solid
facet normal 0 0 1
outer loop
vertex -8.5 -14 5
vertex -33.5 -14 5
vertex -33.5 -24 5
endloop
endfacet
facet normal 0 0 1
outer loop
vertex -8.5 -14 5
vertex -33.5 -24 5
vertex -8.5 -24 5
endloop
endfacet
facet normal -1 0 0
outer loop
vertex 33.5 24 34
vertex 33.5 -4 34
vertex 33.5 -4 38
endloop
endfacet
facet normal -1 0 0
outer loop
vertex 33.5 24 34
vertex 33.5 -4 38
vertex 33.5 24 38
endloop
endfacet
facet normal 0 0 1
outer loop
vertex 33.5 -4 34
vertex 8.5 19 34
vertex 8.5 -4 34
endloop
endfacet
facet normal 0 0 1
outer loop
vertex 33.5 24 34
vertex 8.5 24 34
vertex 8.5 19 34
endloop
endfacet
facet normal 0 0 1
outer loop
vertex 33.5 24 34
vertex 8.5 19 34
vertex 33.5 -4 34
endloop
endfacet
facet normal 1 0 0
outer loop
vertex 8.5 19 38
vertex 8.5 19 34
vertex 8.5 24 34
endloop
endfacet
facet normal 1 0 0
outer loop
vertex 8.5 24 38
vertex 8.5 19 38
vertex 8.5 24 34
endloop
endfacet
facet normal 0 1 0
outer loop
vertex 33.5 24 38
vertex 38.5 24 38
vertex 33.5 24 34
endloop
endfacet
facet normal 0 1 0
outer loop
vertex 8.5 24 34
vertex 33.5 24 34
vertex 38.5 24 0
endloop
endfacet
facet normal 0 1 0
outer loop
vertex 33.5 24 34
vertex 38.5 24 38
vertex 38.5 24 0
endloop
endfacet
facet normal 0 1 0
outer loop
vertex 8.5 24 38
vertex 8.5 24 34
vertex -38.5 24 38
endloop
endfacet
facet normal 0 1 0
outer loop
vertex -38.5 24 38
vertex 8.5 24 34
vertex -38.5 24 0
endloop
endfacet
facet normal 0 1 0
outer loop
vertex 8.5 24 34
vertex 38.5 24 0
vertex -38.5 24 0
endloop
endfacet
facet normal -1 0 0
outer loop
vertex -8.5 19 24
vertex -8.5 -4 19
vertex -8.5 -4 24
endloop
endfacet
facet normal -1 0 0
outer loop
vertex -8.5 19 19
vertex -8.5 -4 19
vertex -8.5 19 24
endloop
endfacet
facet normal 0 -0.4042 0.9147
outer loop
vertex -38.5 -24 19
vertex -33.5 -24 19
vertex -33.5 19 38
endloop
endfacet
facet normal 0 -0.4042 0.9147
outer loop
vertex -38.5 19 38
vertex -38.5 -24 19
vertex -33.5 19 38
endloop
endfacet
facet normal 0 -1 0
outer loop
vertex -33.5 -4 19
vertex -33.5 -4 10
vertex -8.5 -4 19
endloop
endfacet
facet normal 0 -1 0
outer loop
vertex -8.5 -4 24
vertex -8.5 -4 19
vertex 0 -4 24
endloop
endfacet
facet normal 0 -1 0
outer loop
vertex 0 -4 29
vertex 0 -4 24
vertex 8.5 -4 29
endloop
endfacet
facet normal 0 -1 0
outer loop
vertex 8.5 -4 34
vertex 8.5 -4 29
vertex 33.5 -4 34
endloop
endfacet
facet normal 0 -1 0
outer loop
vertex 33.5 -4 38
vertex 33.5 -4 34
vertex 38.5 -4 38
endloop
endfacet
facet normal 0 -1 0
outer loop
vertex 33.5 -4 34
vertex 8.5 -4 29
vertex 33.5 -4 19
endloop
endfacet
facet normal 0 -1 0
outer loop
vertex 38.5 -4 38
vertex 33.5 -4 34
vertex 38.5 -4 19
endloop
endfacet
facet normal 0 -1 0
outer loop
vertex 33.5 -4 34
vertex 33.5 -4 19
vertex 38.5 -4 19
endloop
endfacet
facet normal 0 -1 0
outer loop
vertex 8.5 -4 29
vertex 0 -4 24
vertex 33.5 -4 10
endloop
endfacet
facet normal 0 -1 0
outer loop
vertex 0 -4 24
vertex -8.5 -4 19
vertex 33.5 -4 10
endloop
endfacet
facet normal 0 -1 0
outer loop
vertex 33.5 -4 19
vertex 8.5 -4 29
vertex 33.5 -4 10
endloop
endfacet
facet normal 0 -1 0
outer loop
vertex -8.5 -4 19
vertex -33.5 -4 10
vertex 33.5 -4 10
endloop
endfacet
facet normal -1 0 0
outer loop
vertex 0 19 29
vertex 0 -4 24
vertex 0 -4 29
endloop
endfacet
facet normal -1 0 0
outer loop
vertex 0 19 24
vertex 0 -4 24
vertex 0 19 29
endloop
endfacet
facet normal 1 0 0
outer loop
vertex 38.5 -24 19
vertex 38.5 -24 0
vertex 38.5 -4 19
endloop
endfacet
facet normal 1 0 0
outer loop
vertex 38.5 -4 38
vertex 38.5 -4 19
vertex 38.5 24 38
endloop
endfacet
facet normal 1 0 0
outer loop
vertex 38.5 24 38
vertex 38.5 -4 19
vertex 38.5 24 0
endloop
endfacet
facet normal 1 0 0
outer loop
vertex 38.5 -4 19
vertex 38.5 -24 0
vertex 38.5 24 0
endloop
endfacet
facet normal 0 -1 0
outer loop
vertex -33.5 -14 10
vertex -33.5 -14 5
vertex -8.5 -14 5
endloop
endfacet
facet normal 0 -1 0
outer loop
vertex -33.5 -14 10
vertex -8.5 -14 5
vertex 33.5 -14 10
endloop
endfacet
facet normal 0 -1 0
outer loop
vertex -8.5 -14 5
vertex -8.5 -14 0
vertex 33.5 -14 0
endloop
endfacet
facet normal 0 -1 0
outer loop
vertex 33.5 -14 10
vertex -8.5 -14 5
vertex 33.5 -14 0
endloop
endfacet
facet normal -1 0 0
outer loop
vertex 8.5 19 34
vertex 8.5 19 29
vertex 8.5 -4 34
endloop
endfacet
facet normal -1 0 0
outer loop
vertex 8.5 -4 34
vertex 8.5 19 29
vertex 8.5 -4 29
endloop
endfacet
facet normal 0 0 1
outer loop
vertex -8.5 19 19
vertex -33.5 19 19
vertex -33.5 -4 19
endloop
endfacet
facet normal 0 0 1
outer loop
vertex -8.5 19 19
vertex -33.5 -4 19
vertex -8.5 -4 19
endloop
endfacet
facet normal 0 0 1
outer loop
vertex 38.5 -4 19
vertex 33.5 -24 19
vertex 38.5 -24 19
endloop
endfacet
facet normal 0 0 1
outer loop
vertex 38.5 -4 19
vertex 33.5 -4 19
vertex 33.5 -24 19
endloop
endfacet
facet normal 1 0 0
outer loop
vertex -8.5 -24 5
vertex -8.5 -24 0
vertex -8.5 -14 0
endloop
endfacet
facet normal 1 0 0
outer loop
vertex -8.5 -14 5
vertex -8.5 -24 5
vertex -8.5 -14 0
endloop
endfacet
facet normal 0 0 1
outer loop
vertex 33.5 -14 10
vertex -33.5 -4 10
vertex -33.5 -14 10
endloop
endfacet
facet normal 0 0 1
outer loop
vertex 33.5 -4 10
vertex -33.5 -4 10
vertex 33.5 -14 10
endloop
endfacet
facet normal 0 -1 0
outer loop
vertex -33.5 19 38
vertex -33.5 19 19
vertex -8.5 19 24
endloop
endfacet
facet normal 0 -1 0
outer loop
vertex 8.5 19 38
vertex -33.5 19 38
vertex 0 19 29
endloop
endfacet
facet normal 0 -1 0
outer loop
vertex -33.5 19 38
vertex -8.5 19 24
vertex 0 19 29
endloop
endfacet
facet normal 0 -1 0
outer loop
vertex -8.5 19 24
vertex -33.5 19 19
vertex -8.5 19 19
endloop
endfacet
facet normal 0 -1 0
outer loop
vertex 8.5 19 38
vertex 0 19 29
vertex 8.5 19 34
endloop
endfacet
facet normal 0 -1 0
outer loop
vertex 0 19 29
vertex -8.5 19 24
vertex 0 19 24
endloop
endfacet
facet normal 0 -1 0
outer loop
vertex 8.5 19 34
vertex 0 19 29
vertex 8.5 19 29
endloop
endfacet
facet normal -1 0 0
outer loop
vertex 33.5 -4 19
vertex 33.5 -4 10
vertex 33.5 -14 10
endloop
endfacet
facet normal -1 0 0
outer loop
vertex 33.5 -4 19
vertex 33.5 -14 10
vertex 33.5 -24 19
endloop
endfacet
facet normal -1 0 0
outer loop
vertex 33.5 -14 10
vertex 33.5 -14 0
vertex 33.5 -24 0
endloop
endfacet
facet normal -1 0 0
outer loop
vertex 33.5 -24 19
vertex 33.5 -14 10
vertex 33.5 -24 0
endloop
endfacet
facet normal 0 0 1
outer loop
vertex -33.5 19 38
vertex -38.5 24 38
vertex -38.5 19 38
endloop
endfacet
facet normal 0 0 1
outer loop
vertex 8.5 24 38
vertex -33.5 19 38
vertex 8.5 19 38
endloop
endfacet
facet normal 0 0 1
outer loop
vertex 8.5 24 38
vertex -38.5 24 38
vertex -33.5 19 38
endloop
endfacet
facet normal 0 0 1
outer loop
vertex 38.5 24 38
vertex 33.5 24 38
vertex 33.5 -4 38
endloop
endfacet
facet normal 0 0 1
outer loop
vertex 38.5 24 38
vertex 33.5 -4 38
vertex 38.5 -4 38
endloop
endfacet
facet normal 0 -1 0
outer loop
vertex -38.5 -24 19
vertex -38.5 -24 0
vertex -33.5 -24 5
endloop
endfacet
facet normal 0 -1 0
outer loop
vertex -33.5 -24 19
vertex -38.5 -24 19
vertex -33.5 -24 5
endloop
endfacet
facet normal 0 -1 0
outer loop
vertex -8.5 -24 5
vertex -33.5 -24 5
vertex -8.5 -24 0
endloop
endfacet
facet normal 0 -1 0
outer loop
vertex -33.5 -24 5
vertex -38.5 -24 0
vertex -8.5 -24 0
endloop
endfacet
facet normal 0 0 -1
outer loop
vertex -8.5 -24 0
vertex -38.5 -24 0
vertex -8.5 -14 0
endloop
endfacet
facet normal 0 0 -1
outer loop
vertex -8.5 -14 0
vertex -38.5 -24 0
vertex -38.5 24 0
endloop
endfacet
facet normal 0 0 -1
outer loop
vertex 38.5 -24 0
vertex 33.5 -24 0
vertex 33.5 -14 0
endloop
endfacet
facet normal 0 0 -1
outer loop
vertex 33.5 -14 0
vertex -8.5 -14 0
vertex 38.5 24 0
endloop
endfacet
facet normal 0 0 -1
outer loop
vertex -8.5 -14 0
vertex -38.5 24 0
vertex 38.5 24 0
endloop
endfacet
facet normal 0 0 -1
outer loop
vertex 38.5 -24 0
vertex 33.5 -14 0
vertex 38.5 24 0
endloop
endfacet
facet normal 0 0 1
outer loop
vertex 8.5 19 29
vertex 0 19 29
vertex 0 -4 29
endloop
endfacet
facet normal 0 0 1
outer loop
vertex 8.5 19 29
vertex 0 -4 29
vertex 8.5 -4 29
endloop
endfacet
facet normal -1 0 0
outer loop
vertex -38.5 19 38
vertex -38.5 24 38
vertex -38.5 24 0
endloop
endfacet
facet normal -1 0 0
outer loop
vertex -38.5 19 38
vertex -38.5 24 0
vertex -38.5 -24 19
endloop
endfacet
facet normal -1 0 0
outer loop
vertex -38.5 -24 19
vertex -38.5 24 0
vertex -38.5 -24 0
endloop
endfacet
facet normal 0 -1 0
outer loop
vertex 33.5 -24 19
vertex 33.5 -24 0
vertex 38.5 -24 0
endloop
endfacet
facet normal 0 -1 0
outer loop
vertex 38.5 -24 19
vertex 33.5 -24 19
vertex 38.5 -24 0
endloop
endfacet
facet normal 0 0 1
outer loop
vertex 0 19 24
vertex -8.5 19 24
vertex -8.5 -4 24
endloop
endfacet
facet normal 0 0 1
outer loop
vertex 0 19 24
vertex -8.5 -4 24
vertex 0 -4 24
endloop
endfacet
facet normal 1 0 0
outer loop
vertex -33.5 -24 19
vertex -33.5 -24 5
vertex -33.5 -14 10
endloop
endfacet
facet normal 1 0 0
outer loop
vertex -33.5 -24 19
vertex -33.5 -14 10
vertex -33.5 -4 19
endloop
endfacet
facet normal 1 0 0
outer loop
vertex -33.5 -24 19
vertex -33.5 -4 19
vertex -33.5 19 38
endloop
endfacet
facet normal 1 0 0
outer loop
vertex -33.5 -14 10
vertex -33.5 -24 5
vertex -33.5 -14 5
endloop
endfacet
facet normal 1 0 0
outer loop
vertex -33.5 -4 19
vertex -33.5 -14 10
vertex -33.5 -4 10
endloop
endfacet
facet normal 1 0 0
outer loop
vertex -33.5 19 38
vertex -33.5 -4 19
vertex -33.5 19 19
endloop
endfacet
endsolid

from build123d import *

# Parameters (mm, degrees)
F1_DEPTH  = 38
F3_DEPTH  = 25
F4_DEPTH  = 38
F0_W      = 5
F0_H      = 28
F5_DEPTH  = 38
F6_DEPTH  = 34
F0_W_2    = 8.5
F0_H_2    = 23
F7_DEPTH  = 29
F8_DEPTH  = 24
F0_W_3    = 25
F9_DEPTH  = 19
F10_DEPTH = 10
F0_H_3    = 10
F11_DEPTH = 5
F12_DEPTH = 19


with BuildPart() as f1:
    # F0 (on Top) → F1 (new body)
    with BuildSketch(Plane.XY):
        Polygon((-33.5, -24), (-33.5, -14), (-33.5, -4), (-33.5, 19), (-38.5, 19), (-38.5, -24), align=None)
    extrude(amount=F1_DEPTH)

    # F2 (on face) → F3 (cut)
    with BuildSketch(Plane.YZ.offset(-33.5)):
        Polygon((-24, 19), (19, 38), (-24, 38), align=None)
    extrude(amount=-F3_DEPTH, mode=Mode.SUBTRACT)

    # F0 (on Top) → F4 (join)
    with BuildSketch(Plane.XY):
        Polygon((8.5, 19), (8.5, 24), (-38.5, 24), (-38.5, 19), (-33.5, 19), (-8.5, 19), (0, 19), align=None)
    extrude(amount=F4_DEPTH)



with BuildPart() as f5:
    # F0 (on Top) → F5 (new body)
    with BuildSketch(Plane.XY):
        with Locations((36, 10)):
            Rectangle(F0_W, F0_H)
    extrude(amount=F5_DEPTH)


with BuildPart() as f1_1:
    add(f1.part)

    add(f5.part)  # F6 merges F5
    # F0 (on Top) → F6 (join)
    with BuildSketch(Plane.XY):
        Polygon((8.5, -4), (33.5, -4), (33.5, 24), (8.5, 24), (8.5, 19), align=None)
    extrude(amount=F6_DEPTH)

    # F0 (on Top) → F7 (join)
    with BuildSketch(Plane.XY):
        with Locations((4.25, 7.5)):
            Rectangle(F0_W_2, F0_H_2)
    extrude(amount=F7_DEPTH)

    # F0 (on Top) → F8 (join)
    with BuildSketch(Plane.XY):
        with Locations((-4.25, 7.5)):
            Rectangle(F0_W_2, F0_H_2)
    extrude(amount=F8_DEPTH)

    # F0 (on Top) → F9 (join)
    with BuildSketch(Plane.XY):
        with Locations((-21, 7.5)):
            Rectangle(F0_W_3, F0_H_2)
    extrude(amount=F9_DEPTH)

    # F0 (on Top) → F10 (join)
    with BuildSketch(Plane.XY):
        Polygon((-8.5, -14), (33.5, -14), (33.5, -4), (8.5, -4), (0, -4), (-8.5, -4), (-33.5, -4), (-33.5, -14), align=None)
    extrude(amount=F10_DEPTH)

    # F0 (on Top) → F11 (join)
    with BuildSketch(Plane.XY):
        with Locations((-21, -19)):
            Rectangle(F0_W_3, F0_H_3)
    extrude(amount=F11_DEPTH)

    # F0 (on Top) → F12 (join)
    with BuildSketch(Plane.XY):
        Polygon((33.5, -24), (38.5, -24), (38.5, -4), (33.5, -4), (33.5, -14), align=None)
    extrude(amount=F12_DEPTH)


solid = f1_1.part
